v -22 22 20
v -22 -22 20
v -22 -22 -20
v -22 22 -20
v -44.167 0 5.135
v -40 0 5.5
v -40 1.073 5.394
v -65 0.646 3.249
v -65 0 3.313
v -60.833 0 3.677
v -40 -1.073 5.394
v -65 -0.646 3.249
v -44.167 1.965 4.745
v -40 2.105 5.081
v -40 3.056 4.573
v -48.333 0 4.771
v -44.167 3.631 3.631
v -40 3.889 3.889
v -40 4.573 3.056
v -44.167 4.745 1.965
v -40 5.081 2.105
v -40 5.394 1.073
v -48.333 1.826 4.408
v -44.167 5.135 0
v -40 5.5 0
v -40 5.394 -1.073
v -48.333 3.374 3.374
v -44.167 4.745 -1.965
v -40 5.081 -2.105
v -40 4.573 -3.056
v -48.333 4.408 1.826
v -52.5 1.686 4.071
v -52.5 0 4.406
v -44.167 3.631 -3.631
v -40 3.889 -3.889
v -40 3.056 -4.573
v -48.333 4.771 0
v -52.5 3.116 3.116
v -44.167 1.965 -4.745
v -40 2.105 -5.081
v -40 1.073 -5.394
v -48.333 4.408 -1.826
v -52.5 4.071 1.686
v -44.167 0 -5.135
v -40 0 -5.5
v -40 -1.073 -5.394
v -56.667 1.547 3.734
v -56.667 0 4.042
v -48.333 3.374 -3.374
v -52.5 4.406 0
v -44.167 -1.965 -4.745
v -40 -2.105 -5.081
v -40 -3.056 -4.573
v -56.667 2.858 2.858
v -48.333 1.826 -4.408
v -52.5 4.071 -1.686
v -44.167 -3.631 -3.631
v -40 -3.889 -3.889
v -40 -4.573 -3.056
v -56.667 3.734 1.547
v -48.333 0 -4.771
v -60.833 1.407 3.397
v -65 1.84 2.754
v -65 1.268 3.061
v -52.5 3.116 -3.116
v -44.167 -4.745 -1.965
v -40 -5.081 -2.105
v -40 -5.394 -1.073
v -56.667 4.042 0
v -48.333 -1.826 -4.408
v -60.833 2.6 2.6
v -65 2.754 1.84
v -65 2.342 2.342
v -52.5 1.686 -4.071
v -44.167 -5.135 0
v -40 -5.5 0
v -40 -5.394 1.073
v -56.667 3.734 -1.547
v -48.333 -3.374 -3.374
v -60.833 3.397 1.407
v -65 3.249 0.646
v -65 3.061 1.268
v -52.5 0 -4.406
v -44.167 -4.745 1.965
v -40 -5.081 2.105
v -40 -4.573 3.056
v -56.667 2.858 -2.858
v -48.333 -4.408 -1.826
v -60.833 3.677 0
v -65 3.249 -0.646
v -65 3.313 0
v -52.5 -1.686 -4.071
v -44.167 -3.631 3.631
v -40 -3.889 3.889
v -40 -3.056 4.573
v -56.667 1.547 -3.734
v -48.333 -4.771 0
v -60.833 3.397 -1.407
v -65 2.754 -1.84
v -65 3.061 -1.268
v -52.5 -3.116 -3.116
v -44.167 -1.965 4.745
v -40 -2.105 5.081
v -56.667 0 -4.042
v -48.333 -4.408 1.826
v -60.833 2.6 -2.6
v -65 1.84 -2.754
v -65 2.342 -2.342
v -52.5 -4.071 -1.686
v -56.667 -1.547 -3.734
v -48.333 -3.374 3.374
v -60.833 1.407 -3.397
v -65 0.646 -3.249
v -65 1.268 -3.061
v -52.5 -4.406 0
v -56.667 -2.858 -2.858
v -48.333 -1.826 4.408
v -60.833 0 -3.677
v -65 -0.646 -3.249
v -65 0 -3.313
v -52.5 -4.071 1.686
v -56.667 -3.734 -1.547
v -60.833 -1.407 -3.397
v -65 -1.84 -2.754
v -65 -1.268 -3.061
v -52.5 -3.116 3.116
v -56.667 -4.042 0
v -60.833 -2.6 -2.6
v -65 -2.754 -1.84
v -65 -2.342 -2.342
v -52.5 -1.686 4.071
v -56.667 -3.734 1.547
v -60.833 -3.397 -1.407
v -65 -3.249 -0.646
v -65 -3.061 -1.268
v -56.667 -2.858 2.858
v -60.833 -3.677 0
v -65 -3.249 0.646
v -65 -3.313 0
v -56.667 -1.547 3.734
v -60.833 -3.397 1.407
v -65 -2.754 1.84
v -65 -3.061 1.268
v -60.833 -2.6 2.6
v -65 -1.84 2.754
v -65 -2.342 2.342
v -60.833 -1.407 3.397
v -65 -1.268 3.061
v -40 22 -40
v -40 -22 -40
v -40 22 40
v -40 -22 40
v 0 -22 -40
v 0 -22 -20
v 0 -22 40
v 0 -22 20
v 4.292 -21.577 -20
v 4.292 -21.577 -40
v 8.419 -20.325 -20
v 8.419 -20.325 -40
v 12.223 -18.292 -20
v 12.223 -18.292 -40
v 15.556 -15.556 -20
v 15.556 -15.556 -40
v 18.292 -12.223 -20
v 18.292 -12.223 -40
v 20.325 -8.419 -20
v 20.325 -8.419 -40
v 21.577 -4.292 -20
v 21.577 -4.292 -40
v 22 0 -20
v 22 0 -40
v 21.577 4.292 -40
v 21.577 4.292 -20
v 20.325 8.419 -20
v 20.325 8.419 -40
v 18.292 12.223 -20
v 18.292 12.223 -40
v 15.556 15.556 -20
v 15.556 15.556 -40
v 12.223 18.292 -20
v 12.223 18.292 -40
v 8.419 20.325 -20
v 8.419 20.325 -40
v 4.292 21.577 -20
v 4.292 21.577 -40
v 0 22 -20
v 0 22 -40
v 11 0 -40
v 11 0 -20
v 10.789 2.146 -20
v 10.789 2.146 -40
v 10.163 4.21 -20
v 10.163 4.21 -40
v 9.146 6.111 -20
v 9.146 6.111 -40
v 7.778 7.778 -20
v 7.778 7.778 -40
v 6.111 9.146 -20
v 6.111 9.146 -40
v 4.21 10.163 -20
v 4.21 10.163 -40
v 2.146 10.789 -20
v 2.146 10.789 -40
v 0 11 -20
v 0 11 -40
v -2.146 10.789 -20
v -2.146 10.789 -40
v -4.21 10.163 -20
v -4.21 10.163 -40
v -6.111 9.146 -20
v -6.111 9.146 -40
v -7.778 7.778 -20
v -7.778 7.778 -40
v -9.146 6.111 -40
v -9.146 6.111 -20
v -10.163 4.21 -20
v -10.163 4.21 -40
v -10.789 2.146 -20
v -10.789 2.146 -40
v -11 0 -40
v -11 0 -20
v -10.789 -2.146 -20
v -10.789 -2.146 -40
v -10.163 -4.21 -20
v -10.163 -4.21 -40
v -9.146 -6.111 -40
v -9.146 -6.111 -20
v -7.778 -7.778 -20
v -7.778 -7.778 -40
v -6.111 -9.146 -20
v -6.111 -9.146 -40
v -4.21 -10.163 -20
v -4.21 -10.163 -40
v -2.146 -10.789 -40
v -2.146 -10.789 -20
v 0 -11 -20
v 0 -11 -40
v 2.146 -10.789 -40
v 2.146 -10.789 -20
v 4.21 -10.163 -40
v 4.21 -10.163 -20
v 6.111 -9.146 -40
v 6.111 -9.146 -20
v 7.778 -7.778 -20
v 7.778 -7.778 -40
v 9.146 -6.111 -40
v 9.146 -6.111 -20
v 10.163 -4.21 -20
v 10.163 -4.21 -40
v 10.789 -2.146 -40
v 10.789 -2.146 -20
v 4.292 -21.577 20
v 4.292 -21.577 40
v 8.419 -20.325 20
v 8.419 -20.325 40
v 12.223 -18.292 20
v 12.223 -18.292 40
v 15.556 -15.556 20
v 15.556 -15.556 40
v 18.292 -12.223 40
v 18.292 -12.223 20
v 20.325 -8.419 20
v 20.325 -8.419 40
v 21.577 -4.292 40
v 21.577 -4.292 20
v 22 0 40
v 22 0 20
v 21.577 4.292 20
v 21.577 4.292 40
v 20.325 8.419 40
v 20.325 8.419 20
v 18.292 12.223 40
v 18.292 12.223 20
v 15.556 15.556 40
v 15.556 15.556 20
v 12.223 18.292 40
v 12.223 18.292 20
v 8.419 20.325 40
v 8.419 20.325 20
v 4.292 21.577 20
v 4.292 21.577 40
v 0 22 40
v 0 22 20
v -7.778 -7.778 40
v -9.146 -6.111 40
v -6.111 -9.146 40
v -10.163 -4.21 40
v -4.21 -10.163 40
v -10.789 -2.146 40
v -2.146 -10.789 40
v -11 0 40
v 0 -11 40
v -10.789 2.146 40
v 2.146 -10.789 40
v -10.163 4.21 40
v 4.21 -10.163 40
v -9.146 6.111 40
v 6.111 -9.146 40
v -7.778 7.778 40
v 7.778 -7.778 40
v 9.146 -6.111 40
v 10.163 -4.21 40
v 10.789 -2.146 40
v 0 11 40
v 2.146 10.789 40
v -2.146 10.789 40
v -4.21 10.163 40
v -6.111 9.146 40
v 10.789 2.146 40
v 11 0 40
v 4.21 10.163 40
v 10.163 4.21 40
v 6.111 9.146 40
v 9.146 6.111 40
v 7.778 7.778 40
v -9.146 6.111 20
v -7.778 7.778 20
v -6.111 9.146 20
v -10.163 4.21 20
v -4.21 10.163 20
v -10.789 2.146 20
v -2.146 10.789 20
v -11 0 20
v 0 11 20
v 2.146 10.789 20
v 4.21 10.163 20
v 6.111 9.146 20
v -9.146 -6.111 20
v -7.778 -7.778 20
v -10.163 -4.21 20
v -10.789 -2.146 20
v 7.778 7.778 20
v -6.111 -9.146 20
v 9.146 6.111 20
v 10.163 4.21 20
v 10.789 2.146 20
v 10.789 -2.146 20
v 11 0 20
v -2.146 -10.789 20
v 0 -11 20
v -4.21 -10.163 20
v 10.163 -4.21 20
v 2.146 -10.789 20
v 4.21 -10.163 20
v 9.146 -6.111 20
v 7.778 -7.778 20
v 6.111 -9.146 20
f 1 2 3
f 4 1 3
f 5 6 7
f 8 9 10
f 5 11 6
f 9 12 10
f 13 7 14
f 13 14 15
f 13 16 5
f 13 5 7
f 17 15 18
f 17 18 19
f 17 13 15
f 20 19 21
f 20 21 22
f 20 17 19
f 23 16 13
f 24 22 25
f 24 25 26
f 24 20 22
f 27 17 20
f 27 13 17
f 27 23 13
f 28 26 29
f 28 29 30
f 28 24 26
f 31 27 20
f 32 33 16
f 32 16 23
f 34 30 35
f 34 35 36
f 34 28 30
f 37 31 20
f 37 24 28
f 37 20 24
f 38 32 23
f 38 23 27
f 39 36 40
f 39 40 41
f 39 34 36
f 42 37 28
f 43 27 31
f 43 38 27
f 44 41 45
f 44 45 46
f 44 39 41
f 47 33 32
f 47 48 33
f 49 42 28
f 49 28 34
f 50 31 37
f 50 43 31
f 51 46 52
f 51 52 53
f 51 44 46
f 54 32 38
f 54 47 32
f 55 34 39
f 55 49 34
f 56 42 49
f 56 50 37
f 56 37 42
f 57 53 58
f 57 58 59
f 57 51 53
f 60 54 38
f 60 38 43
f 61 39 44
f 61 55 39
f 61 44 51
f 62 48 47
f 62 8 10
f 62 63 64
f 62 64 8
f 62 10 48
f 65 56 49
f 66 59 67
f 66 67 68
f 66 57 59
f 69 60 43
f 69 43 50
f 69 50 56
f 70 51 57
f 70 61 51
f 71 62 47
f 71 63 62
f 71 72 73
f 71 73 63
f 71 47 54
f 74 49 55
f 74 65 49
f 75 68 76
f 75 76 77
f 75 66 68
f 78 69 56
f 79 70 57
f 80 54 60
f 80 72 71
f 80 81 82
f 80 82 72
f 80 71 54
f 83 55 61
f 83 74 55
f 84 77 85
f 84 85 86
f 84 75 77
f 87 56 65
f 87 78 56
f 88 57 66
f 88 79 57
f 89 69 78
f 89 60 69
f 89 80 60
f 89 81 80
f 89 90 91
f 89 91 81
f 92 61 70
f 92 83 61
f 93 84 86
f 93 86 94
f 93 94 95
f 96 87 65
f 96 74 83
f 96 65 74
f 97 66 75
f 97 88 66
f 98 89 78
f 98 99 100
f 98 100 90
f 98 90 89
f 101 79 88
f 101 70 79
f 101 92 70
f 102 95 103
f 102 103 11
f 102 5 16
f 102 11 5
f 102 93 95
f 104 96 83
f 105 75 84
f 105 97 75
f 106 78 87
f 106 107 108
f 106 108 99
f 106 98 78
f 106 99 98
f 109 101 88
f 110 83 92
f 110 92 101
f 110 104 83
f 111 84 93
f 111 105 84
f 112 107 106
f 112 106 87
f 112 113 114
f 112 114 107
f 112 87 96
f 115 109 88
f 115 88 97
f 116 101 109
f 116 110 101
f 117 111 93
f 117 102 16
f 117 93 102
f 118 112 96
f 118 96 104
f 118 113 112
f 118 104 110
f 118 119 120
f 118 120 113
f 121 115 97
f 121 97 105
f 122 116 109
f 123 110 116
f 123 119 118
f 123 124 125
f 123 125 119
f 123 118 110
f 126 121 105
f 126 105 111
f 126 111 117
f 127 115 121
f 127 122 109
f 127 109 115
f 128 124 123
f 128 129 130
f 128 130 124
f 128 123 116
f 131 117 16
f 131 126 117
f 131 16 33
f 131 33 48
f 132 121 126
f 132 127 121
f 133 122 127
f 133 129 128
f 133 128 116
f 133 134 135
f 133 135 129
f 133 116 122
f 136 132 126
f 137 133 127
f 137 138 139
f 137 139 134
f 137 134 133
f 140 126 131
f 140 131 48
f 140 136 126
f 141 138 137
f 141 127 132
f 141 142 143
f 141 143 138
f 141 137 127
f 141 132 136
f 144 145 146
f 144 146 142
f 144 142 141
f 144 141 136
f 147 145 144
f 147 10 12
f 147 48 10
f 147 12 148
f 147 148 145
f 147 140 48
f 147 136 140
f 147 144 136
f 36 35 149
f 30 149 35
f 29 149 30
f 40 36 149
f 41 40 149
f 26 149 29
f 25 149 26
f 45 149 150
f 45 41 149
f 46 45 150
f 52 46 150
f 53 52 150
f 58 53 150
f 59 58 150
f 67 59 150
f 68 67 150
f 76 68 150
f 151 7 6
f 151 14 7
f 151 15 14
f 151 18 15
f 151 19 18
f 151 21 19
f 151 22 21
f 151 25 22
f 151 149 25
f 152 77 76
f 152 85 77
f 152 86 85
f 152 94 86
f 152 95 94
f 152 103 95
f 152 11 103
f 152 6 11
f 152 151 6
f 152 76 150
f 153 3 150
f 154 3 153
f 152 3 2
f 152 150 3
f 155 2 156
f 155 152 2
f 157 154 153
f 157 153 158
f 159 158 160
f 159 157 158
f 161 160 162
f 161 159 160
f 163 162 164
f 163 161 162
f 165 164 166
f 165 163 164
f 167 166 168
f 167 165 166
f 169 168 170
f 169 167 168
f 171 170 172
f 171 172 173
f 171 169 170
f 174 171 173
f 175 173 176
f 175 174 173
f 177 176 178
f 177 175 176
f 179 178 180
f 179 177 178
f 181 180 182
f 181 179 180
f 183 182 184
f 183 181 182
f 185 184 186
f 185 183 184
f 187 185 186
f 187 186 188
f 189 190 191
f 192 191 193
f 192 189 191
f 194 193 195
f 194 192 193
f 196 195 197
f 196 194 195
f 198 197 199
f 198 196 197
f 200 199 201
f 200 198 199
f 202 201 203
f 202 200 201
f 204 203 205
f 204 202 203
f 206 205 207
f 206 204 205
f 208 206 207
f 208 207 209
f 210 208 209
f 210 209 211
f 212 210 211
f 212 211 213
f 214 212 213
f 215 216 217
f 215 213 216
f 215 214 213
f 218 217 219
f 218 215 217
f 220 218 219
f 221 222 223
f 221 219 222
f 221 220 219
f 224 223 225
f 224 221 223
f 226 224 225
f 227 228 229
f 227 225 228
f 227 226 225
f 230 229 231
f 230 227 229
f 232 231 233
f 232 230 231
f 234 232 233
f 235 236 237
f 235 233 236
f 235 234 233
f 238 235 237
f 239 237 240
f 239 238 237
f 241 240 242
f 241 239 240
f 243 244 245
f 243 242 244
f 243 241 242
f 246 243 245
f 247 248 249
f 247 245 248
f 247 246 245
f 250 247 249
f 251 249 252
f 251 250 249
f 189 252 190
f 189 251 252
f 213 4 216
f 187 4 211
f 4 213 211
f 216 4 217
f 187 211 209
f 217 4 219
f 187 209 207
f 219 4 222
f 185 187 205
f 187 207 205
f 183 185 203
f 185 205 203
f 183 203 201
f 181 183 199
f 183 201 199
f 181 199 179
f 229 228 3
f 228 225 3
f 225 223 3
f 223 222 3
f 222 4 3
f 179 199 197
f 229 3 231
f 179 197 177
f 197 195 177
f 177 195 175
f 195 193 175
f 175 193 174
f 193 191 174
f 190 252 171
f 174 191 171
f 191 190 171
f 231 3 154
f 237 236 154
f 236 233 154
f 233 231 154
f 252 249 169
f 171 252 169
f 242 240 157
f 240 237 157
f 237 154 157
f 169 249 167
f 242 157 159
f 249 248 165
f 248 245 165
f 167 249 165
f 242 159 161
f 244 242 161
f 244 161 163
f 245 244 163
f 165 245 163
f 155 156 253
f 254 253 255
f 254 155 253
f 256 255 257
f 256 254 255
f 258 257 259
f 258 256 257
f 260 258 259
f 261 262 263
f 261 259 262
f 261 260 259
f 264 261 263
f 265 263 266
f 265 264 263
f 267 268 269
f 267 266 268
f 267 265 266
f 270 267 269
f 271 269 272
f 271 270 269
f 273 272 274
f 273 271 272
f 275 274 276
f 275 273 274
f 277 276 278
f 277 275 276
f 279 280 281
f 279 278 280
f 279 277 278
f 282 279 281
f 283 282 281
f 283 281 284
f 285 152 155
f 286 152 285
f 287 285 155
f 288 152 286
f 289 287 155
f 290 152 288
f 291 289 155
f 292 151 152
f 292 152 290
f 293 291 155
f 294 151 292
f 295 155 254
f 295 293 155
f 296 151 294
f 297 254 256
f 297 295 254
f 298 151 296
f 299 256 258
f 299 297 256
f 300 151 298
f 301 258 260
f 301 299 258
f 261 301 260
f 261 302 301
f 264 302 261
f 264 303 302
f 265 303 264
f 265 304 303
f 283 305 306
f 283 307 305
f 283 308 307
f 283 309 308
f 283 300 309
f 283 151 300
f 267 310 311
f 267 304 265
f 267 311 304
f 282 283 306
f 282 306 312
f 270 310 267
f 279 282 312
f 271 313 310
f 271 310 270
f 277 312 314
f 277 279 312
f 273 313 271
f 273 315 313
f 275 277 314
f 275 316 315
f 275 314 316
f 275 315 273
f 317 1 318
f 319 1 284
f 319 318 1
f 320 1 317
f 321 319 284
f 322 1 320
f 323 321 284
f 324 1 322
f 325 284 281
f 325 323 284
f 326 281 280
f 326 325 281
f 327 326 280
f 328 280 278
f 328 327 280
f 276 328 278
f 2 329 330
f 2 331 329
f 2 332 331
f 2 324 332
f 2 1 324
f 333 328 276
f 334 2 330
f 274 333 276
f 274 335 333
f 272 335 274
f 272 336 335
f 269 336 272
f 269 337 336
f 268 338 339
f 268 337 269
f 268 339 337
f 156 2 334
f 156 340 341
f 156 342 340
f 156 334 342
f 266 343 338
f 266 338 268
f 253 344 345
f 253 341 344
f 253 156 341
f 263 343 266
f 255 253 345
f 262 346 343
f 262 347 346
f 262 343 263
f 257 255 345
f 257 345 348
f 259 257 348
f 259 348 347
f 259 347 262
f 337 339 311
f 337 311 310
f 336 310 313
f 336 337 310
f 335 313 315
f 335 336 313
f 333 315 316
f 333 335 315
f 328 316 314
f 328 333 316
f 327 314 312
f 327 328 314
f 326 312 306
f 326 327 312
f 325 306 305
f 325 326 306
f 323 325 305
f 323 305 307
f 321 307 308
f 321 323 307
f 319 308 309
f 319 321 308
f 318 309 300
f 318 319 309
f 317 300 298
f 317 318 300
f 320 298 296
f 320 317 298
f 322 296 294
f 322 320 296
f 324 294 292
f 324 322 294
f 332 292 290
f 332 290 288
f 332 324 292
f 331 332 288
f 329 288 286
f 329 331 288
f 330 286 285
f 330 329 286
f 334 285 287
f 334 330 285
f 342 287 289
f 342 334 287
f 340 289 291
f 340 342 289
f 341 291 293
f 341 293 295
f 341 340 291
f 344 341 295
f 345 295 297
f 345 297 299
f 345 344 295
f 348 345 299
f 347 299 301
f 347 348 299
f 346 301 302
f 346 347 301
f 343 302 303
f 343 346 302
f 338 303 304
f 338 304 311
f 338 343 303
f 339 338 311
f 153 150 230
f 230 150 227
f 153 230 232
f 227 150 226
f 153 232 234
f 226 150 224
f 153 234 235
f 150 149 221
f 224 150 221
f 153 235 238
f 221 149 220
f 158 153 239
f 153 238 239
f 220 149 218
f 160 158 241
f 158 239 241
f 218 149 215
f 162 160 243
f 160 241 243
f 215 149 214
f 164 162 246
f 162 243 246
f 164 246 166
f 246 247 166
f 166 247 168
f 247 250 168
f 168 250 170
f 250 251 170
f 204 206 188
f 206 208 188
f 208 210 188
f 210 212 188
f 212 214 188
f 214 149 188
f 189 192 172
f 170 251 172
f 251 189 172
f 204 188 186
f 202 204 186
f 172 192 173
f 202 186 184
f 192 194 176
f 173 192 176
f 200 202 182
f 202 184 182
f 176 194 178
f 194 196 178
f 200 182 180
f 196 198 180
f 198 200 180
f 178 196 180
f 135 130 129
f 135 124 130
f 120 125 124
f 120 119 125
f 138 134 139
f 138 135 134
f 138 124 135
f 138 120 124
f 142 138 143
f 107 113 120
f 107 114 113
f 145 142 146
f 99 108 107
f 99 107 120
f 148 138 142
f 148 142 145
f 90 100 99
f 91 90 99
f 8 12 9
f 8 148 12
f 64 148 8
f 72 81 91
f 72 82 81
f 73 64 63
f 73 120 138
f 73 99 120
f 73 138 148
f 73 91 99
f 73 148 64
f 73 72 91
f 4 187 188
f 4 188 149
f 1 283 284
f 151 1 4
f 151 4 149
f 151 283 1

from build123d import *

# Parameters (mm, degrees)
SKETCH2_R               = 11
BOSS_EXTRUDE1_DEPTH     = 40
CUT_EXTRUDE1_DEPTH      = 61.695963622
CUT_EXTRUDE1_DEPTH_BACK = 61.695963622
SKETCH3_W               = 44
SKETCH3_H               = 40
SKETCH4_R               = 5.5
BOSS_EXTRUDE2_DEPTH     = 25
BOSS_EXTRUDE2_TAPER     = 5


with BuildPart() as part:
    # Sketch2 → Boss-Extrude1 (new, symmetric)
    with BuildSketch(Plane.XY):
        with BuildLine():
            Line((0, 22), (-40, 22))
            Line((-40, 22), (-40, -22))
            Line((-40, -22), (0, -22))
            ThreePointArc((0, -22), (22, 0), (0, 22))
        make_face()
        Circle(SKETCH2_R, mode=Mode.SUBTRACT)
    extrude(amount=BOSS_EXTRUDE1_DEPTH, both=True)

    # Sketch3 → Cut-Extrude1 (cut, two sides: drawn at the far end of the back side and taken through both)
    with BuildSketch(Plane(origin=(0, 0, 0), x_dir=(1, 0, 0), z_dir=(0, 1, 0)).offset(-CUT_EXTRUDE1_DEPTH_BACK)):
        Rectangle(SKETCH3_W, SKETCH3_H)
    extrude(amount=CUT_EXTRUDE1_DEPTH + CUT_EXTRUDE1_DEPTH_BACK, mode=Mode.SUBTRACT)

    # Sketch4 → Boss-Extrude2 (add)
    with BuildSketch(Plane.ZY.offset(40)):
        Circle(SKETCH4_R)
    extrude(amount=BOSS_EXTRUDE2_DEPTH, taper=BOSS_EXTRUDE2_TAPER)


solid = part.part
